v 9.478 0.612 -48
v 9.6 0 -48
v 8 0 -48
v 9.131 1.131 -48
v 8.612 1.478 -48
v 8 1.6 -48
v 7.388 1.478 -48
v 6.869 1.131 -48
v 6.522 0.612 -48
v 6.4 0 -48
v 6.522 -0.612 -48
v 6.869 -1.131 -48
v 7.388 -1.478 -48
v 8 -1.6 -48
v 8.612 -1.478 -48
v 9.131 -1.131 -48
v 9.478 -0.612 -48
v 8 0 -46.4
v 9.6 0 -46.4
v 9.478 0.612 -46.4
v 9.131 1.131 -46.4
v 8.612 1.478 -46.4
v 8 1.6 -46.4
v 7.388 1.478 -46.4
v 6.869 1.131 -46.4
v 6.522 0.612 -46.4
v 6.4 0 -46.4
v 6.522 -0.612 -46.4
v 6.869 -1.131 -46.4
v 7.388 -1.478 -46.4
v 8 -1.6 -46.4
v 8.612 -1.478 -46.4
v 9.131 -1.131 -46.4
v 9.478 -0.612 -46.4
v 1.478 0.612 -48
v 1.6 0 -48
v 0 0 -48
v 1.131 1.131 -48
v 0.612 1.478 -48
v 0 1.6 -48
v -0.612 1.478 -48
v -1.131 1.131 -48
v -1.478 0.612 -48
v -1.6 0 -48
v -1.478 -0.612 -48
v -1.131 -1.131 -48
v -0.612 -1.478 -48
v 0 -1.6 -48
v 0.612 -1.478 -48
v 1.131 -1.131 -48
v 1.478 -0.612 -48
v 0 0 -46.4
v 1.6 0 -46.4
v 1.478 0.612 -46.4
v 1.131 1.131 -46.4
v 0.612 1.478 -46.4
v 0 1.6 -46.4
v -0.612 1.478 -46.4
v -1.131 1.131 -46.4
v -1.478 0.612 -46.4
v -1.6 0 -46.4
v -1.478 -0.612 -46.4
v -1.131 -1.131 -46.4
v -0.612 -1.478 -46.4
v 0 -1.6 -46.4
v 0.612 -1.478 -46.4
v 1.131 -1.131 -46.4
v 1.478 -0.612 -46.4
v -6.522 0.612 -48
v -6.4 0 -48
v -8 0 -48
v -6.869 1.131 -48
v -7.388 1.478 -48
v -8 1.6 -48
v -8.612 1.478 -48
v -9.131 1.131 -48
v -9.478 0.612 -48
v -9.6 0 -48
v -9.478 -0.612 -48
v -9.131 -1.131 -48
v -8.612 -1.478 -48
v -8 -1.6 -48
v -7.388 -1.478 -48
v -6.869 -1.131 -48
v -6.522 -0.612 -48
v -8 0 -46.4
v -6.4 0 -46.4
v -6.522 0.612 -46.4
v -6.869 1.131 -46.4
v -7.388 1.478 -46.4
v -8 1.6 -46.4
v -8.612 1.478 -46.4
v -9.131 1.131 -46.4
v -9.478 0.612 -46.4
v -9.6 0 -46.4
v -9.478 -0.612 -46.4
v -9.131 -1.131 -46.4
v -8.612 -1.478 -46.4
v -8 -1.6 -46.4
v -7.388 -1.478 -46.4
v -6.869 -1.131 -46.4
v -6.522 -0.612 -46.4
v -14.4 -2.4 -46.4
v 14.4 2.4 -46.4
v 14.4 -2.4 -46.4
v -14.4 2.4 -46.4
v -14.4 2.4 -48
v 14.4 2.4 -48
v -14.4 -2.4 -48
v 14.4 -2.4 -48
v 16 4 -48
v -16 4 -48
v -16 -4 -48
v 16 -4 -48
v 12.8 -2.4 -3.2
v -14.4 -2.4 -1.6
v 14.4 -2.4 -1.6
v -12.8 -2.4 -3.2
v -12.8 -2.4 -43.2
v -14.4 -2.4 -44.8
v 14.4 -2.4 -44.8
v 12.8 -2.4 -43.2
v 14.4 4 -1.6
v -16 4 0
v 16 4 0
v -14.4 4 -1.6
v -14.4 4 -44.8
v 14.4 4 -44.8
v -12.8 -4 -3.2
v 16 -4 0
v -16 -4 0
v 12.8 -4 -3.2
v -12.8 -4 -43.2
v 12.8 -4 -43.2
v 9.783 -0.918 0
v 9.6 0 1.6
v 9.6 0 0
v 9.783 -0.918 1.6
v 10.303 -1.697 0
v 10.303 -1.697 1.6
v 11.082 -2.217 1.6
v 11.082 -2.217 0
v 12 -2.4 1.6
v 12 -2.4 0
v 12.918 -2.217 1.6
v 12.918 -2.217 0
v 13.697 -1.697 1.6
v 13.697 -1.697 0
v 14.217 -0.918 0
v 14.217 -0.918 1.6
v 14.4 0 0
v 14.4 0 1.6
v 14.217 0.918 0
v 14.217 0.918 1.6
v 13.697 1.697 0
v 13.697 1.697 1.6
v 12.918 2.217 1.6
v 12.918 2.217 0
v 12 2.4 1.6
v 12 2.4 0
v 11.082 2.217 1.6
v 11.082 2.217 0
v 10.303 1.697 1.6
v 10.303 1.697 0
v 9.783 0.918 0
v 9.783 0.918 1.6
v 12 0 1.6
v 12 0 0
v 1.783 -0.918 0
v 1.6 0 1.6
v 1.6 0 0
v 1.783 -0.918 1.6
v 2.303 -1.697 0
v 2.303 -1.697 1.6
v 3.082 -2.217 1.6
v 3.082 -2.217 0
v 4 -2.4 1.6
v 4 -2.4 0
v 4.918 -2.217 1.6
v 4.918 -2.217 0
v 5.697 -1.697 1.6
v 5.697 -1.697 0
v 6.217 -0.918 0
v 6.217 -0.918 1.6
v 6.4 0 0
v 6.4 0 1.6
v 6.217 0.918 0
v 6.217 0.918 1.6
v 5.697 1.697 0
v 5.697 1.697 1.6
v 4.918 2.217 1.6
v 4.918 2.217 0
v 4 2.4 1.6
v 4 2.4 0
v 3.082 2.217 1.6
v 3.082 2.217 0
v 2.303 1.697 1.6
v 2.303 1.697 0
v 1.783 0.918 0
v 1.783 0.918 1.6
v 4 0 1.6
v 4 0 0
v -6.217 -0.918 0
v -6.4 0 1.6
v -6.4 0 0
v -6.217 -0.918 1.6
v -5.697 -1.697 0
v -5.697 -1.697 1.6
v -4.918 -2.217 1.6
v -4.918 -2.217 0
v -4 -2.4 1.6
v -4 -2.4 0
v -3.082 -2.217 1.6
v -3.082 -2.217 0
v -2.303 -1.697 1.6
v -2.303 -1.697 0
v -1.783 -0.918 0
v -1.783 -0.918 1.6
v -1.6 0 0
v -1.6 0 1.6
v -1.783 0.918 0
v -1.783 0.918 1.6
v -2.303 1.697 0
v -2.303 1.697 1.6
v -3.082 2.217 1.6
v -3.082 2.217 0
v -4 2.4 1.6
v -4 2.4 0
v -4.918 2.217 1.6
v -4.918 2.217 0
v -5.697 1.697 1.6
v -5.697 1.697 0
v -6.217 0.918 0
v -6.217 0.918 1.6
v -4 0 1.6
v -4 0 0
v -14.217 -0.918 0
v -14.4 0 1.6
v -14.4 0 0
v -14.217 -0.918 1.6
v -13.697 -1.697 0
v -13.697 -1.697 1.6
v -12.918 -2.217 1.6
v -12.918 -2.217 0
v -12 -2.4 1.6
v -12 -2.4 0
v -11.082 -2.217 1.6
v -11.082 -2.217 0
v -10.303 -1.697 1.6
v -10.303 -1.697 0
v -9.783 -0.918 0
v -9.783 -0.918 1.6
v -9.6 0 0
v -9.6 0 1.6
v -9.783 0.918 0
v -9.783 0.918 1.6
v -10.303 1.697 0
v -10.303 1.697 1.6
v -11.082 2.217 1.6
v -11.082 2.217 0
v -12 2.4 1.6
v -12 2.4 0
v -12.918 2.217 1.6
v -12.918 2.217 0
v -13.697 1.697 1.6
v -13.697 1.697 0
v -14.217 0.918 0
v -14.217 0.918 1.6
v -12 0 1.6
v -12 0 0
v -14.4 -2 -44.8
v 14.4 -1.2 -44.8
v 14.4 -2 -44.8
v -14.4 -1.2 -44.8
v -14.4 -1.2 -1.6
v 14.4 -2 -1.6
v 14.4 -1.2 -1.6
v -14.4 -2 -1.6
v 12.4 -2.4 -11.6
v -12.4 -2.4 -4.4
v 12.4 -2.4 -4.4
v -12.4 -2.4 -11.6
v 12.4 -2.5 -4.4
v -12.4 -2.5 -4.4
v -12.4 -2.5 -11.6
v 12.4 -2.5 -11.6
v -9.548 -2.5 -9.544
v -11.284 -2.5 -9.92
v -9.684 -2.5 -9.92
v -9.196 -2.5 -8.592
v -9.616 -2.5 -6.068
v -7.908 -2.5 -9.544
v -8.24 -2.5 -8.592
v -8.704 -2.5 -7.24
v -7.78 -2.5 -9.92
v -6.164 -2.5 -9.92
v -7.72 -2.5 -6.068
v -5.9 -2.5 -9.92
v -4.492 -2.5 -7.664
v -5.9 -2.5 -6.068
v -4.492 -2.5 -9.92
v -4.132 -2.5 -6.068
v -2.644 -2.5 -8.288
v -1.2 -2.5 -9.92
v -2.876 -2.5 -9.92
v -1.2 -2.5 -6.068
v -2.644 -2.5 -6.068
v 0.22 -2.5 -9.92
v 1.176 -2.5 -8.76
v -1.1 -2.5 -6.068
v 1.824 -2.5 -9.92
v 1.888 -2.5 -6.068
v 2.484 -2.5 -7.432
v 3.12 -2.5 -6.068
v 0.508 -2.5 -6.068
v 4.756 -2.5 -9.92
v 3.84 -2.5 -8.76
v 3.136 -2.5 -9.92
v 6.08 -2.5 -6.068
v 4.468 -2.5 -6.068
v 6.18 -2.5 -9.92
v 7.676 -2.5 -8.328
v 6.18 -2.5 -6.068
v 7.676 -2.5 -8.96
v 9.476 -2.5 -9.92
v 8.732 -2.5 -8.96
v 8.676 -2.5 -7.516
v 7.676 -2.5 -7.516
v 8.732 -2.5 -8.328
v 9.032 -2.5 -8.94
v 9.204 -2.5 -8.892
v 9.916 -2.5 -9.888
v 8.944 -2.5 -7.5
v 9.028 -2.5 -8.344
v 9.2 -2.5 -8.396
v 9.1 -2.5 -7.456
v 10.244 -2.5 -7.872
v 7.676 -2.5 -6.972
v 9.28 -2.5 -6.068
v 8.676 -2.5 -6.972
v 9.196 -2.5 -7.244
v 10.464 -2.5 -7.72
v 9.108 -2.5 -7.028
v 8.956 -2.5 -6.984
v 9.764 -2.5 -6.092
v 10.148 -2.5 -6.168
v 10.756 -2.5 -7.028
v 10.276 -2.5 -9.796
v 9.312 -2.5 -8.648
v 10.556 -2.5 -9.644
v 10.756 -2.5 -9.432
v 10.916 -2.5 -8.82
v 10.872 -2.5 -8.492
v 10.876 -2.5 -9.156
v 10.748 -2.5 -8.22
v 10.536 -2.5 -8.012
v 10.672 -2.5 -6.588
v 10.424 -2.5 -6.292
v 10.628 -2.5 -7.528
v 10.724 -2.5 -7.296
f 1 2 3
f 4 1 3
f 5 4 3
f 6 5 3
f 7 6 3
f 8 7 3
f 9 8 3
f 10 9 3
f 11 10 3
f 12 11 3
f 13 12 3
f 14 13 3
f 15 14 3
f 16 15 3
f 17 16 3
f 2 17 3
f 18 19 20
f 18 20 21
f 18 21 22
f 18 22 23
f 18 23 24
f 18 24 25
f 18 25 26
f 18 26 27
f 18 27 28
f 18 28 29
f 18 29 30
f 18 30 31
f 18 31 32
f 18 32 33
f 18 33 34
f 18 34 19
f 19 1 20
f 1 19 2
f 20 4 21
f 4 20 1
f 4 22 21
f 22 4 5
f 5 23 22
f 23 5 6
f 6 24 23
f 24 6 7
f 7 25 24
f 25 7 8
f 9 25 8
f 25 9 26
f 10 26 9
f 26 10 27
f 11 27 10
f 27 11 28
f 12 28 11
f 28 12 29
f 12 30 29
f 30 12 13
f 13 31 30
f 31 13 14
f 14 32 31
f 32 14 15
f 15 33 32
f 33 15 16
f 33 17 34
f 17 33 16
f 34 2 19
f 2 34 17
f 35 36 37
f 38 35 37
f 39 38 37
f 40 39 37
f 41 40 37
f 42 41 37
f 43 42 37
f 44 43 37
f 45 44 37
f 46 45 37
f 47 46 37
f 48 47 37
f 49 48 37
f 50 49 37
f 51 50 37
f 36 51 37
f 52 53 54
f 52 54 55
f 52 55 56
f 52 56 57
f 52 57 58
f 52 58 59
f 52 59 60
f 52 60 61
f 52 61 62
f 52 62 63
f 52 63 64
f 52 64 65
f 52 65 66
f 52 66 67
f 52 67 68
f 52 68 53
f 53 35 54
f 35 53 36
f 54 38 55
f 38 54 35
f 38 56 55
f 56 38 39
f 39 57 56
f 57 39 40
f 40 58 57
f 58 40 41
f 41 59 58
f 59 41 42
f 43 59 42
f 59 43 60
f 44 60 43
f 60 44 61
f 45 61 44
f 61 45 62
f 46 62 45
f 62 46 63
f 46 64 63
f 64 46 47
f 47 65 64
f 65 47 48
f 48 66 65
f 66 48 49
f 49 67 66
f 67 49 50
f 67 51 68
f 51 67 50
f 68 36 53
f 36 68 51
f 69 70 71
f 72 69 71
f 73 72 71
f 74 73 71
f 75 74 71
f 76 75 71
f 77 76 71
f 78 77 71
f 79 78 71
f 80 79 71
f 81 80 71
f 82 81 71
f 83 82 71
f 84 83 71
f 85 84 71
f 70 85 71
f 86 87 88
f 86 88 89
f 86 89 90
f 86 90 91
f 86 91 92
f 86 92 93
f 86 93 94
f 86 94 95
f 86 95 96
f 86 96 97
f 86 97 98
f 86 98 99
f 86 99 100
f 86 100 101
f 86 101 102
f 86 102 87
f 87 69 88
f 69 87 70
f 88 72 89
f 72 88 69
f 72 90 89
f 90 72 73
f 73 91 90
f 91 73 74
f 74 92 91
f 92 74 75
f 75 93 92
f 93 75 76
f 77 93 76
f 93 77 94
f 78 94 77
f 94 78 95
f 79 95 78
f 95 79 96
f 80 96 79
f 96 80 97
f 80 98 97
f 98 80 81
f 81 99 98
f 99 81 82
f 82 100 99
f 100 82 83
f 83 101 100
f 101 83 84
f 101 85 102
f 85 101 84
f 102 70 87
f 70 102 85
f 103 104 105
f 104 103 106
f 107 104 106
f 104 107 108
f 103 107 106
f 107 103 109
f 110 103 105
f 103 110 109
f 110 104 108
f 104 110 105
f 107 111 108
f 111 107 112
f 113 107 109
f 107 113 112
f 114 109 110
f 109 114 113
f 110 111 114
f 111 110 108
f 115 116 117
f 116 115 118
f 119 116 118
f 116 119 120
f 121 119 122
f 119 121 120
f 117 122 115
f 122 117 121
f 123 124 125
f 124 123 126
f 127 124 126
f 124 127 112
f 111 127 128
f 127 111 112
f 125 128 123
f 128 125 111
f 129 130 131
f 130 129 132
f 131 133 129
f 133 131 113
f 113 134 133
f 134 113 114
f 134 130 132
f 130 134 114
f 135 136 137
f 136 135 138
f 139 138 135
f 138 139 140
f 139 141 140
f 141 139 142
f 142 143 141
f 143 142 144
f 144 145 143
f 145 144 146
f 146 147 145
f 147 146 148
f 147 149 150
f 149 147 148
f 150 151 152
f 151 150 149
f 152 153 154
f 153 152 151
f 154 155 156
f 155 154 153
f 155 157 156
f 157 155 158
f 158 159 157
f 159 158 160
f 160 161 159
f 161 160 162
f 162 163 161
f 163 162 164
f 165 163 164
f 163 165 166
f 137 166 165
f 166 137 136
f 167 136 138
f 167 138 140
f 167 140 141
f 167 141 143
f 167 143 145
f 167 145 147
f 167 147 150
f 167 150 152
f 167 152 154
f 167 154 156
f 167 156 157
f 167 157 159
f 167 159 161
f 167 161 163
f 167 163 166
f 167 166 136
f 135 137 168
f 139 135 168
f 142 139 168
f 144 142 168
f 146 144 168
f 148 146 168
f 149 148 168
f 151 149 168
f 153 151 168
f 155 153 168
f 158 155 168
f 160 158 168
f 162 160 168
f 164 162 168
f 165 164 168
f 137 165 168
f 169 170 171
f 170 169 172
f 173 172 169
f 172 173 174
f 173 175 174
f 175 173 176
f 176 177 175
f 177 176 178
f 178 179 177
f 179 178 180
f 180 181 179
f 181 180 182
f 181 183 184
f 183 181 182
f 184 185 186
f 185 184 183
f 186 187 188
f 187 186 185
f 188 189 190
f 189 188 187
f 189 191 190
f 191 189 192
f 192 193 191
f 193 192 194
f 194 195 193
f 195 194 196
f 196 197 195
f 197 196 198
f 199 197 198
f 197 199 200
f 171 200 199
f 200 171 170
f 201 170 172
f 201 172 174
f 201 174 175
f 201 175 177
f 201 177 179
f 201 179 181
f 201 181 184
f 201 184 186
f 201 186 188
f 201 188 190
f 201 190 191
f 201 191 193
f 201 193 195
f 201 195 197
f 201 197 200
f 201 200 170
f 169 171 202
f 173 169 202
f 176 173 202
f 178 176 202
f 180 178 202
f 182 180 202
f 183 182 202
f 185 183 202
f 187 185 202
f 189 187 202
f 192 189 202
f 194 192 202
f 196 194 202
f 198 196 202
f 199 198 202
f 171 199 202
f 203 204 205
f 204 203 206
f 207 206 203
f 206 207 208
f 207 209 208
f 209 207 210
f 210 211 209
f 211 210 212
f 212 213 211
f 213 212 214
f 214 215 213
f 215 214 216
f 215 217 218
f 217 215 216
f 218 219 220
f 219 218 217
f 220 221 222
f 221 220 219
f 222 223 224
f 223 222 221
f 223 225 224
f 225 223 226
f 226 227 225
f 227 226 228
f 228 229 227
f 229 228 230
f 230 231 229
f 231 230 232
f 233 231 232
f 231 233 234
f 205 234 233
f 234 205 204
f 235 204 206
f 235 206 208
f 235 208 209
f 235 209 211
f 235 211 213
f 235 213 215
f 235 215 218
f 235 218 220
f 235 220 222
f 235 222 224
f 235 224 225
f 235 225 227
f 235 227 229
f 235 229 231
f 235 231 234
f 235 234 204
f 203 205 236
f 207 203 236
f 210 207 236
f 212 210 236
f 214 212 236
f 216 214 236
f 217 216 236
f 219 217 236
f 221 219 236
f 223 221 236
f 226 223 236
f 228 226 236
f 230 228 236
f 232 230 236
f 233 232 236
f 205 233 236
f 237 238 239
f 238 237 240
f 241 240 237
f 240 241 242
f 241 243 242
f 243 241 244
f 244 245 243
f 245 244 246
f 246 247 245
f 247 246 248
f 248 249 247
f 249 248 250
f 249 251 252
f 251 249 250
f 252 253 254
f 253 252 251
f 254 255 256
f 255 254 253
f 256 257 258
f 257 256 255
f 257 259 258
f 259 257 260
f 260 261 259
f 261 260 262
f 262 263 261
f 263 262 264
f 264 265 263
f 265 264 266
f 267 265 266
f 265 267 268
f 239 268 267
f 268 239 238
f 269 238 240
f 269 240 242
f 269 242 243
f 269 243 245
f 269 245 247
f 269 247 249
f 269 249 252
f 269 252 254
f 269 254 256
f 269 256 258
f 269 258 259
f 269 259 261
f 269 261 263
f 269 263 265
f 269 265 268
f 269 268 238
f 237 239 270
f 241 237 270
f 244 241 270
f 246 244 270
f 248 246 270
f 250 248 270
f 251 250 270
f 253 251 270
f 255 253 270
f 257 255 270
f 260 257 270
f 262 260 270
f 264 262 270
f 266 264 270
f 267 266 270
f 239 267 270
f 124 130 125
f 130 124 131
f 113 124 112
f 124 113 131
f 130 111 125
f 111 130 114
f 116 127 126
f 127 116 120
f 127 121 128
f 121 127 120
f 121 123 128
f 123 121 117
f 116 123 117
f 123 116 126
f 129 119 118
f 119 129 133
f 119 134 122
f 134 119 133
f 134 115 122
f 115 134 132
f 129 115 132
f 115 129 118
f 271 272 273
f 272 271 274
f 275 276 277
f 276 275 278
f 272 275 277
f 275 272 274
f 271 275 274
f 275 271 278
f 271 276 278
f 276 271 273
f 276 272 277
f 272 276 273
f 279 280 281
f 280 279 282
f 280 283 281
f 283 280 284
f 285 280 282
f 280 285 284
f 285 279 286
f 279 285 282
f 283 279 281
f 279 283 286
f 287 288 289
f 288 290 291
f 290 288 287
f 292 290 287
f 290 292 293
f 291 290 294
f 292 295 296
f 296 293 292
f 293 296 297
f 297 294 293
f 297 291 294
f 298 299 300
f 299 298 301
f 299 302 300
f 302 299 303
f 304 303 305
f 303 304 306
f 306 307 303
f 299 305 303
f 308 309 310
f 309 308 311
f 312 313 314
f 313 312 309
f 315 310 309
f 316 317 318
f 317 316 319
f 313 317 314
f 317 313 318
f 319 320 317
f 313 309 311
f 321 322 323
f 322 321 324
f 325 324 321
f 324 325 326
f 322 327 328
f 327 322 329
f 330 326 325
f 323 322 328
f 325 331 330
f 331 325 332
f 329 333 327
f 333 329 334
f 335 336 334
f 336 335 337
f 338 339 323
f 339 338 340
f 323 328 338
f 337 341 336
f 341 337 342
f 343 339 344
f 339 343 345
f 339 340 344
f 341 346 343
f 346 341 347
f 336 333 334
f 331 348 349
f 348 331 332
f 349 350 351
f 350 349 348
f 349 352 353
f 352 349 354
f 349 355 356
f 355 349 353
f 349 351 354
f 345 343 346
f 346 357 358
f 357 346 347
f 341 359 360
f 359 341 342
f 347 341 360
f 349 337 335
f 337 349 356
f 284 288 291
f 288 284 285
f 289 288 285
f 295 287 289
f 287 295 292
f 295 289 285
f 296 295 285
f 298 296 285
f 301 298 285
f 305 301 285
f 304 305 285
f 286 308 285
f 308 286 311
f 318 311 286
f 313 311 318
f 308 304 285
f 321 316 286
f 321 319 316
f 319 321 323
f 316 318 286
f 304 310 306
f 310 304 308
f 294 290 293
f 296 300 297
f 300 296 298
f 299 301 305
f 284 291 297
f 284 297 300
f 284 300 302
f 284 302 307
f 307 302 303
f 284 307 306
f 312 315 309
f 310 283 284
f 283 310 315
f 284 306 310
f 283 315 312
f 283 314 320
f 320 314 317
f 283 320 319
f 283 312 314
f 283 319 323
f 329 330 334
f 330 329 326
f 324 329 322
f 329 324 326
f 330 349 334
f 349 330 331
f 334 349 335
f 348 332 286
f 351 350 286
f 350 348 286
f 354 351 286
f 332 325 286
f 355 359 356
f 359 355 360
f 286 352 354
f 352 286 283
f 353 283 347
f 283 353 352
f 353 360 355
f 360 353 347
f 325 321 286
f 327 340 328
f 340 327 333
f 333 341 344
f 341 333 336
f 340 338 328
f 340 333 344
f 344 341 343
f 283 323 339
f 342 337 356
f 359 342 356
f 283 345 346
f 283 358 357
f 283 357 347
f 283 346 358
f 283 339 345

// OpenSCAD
// file: ../p/4-4edge.scad
use <../lib.scad>
function ldraw_lib__4_4edge() = [
// 0 Circle 1.0
// 0 Name: 4-4edge.dat
// 0 Author: James Jessiman
// 0 !LDRAW_ORG Primitive UPDATE 2017-01
// 0 !LICENSE Licensed under CC BY 2.0 and CC BY 4.0 : see CAreadme.txt
// 
// 0 BFC CERTIFY CCW
  [0,"BFC","CERTIFY"],
  [0,"BFC","CCW"],
// 
// 0 !HISTORY 1998-12-15 [PTadmin] Official Update 1998-10
// 0 !HISTORY 2005-12-28 [PTadmin] Official Update 2005-01
// 0 !HISTORY 2007-06-24 [PTadmin] Header formatted for Contributor Agreement
// 0 !HISTORY 2008-07-01 [PTadmin] Official Update 2008-01
// 0 !HISTORY 2017-01-15 [Steffen] BFCed
// 0 !HISTORY 2017-12-30 [PTadmin] Official Update 2017-01
// 
// 
// 2 24 1 0 0 0.9239 0 0.3827
  [2,24,1,0,0,0.9239,0,0.3827],
// 2 24 0.9239 0 0.3827 0.7071 0 0.7071
  [2,24,0.9239,0,0.3827,0.7071,0,0.7071],
// 2 24 0.7071 0 0.7071 0.3827 0 0.9239
  [2,24,0.7071,0,0.7071,0.3827,0,0.9239],
// 2 24 0.3827 0 0.9239 0 0 1
  [2,24,0.3827,0,0.9239,0,0,1],
// 2 24 0 0 1 -0.3827 0 0.9239
  [2,24,0,0,1,-0.3827,0,0.9239],
// 2 24 -0.3827 0 0.9239 -0.7071 0 0.7071
  [2,24,-0.3827,0,0.9239,-0.7071,0,0.7071],
// 2 24 -0.7071 0 0.7071 -0.9239 0 0.3827
  [2,24,-0.7071,0,0.7071,-0.9239,0,0.3827],
// 2 24 -0.9239 0 0.3827 -1 0 -0
  [2,24,-0.9239,0,0.3827,-1,0,-0],
// 2 24 -1 0 -0 -0.9239 0 -0.3827
  [2,24,-1,0,-0,-0.9239,0,-0.3827],
// 2 24 -0.9239 0 -0.3827 -0.7071 0 -0.7071
  [2,24,-0.9239,0,-0.3827,-0.7071,0,-0.7071],
// 2 24 -0.7071 0 -0.7071 -0.3827 0 -0.9239
  [2,24,-0.7071,0,-0.7071,-0.3827,0,-0.9239],
// 2 24 -0.3827 0 -0.9239 0 0 -1
  [2,24,-0.3827,0,-0.9239,0,0,-1],
// 2 24 0 0 -1 0.3827 0 -0.9239
  [2,24,0,0,-1,0.3827,0,-0.9239],
// 2 24 0.3827 0 -0.9239 0.7071 0 -0.7071
  [2,24,0.3827,0,-0.9239,0.7071,0,-0.7071],
// 2 24 0.7071 0 -0.7071 0.9239 0 -0.3827
  [2,24,0.7071,0,-0.7071,0.9239,0,-0.3827],
// 2 24 0.9239 0 -0.3827 1 0 0
  [2,24,0.9239,0,-0.3827,1,0,0],
];
module ldraw_lib__4_4edge(step=0, col=false, unit=2/5, alt=false, line=0.2, solid=!$preview)
    makepoly(ldraw_lib__4_4edge(), step=step, col=col, unit=unit, alt=alt, line=line, solid=solid);
ldraw_lib__4_4edge(line=0.2);
// file: ../p/4-4disc.scad
use <../lib.scad>
function ldraw_lib__4_4disc() = [
// 0 Disc 1.0
// 0 Name: 4-4disc.dat
// 0 Author: James Jessiman
// 0 !LDRAW_ORG Primitive UPDATE 2002-02
// 0 !LICENSE Licensed under CC BY 2.0 and CC BY 4.0 : see CAreadme.txt
// 
// 0 BFC CERTIFY CCW
  [0,"BFC","CERTIFY"],
  [0,"BFC","CCW"],
// 
// 0 !HISTORY 1998-12-15 [PTadmin] Official Update 1998-10
// 0 !HISTORY 2002-03-23 [sbliss] Added BFC statement
// 0 !HISTORY 2002-04-25 [PTadmin] Official Update 2002-02
// 0 !HISTORY 2007-06-24 [PTadmin] Header formatted for Contributor Agreement
// 0 !HISTORY 2008-07-01 [PTadmin] Official Update 2008-01
// 
// 
// 3 16 0 0 0 1 0 0 0.9239 0 0.3827
  [3,16,0,0,0,1,0,0,0.9239,0,0.3827],
// 3 16 0 0 0 0.9239 0 0.3827 0.7071 0 0.7071
  [3,16,0,0,0,0.9239,0,0.3827,0.7071,0,0.7071],
// 3 16 0 0 0 0.7071 0 0.7071 0.3827 0 0.9239
  [3,16,0,0,0,0.7071,0,0.7071,0.3827,0,0.9239],
// 3 16 0 0 0 0.3827 0 0.9239 0 0 1
  [3,16,0,0,0,0.3827,0,0.9239,0,0,1],
// 3 16 0 0 0 0 0 1 -0.3827 0 0.9239
  [3,16,0,0,0,0,0,1,-0.3827,0,0.9239],
// 3 16 0 0 0 -0.3827 0 0.9239 -0.7071 0 0.7071
  [3,16,0,0,0,-0.3827,0,0.9239,-0.7071,0,0.7071],
// 3 16 0 0 0 -0.7071 0 0.7071 -0.9239 0 0.3827
  [3,16,0,0,0,-0.7071,0,0.7071,-0.9239,0,0.3827],
// 3 16 0 0 0 -0.9239 0 0.3827 -1 0 -0
  [3,16,0,0,0,-0.9239,0,0.3827,-1,0,-0],
// 3 16 0 0 0 -1 0 -0 -0.9239 0 -0.3827
  [3,16,0,0,0,-1,0,-0,-0.9239,0,-0.3827],
// 3 16 0 0 0 -0.9239 0 -0.3827 -0.7071 0 -0.7071
  [3,16,0,0,0,-0.9239,0,-0.3827,-0.7071,0,-0.7071],
// 3 16 0 0 0 -0.7071 0 -0.7071 -0.3827 0 -0.9239
  [3,16,0,0,0,-0.7071,0,-0.7071,-0.3827,0,-0.9239],
// 3 16 0 0 0 -0.3827 0 -0.9239 0 0 -1
  [3,16,0,0,0,-0.3827,0,-0.9239,0,0,-1],
// 3 16 0 0 0 0 0 -1 0.3827 0 -0.9239
  [3,16,0,0,0,0,0,-1,0.3827,0,-0.9239],
// 3 16 0 0 0 0.3827 0 -0.9239 0.7071 0 -0.7071
  [3,16,0,0,0,0.3827,0,-0.9239,0.7071,0,-0.7071],
// 3 16 0 0 0 0.7071 0 -0.7071 0.9239 0 -0.3827
  [3,16,0,0,0,0.7071,0,-0.7071,0.9239,0,-0.3827],
// 3 16 0 0 0 0.9239 0 -0.3827 1 0 0
  [3,16,0,0,0,0.9239,0,-0.3827,1,0,0],
// 0
];
module ldraw_lib__4_4disc(step=0, col=false, unit=2/5, alt=false, line=0.2, solid=!$preview)
    makepoly(ldraw_lib__4_4disc(), step=step, col=col, unit=unit, alt=alt, line=line, solid=solid);
ldraw_lib__4_4disc(line=0.2);
// file: ../p/4-4cyli.scad
use <../lib.scad>
$fa=1; $fs=0.2;
function ldraw_lib__4_4cyli(realsolid=false) = [
// 0 Cylinder 1.0
// 0 Name: 4-4cyli.dat
// 0 Author: James Jessiman
// 0 !LDRAW_ORG Primitive UPDATE 2005-01
// 0 !LICENSE Licensed under CC BY 2.0 and CC BY 4.0 : see CAreadme.txt
// 
// 0 BFC CERTIFY CCW
  [0,"BFC","CERTIFY"],
  [0,"BFC","CCW"],
// 
// 0 !HISTORY 1998-12-15 [PTadmin] Official Update 1998-10
// 0 !HISTORY 2002-03-23 [sbliss] Added BFC statement; merged headers from files in distributions LDraw 0.27 and Complete.
// 0 !HISTORY 2002-04-25 [PTadmin] Official Update 2002-02
// 0 !HISTORY 2004-12-14 [guyvivan] BFC CCW
// 0 !HISTORY 2005-12-28 [PTadmin] Official Update 2005-01
// 0 !HISTORY 2007-06-24 [PTadmin] Header formatted for Contributor Agreement
// 0 !HISTORY 2008-07-01 [PTadmin] Official Update 2008-01
// 
// 
// 4 16 1 1 0 0.9239 1 0.3827 0.9239 0 0.3827 1 0 0
  [4,16,1,1,0,0.9239,1,0.3827,0.9239,0,0.3827,1,0,0],
// 5 24 1 0 0 1 1 0 0.9239 0 0.3827 0.9239 0 -0.3827
  [5,24,1,0,0,1,1,0,0.9239,0,0.3827,0.9239,0,-0.3827],
// 4 16 0.9239 1 0.3827 0.7071 1 0.7071 0.7071 0 0.7071 0.9239 0 0.3827
  [4,16,0.9239,1,0.3827,0.7071,1,0.7071,0.7071,0,0.7071,0.9239,0,0.3827],
// 5 24 0.9239 0 0.3827 0.9239 1 0.3827 0.7071 0 0.7071 1 0 0
  [5,24,0.9239,0,0.3827,0.9239,1,0.3827,0.7071,0,0.7071,1,0,0],
// 4 16 0.7071 1 0.7071 0.3827 1 0.9239 0.3827 0 0.9239 0.7071 0 0.7071
  [4,16,0.7071,1,0.7071,0.3827,1,0.9239,0.3827,0,0.9239,0.7071,0,0.7071],
// 5 24 0.7071 0 0.7071 0.7071 1 0.7071 0.3827 0 0.9239 0.9239 0 0.3827
  [5,24,0.7071,0,0.7071,0.7071,1,0.7071,0.3827,0,0.9239,0.9239,0,0.3827],
// 4 16 0.3827 1 0.9239 0 1 1 0 0 1 0.3827 0 0.9239
  [4,16,0.3827,1,0.9239,0,1,1,0,0,1,0.3827,0,0.9239],
// 5 24 0.3827 0 0.9239 0.3827 1 0.9239 0 0 1 0.7071 0 0.7071
  [5,24,0.3827,0,0.9239,0.3827,1,0.9239,0,0,1,0.7071,0,0.7071],
// 4 16 0 1 1 -0.3827 1 0.9239 -0.3827 0 0.9239 0 0 1
  [4,16,0,1,1,-0.3827,1,0.9239,-0.3827,0,0.9239,0,0,1],
// 5 24 0 0 1 0 1 1 -0.3827 0 0.9239 0.3827 0 0.9239
  [5,24,0,0,1,0,1,1,-0.3827,0,0.9239,0.3827,0,0.9239],
// 4 16 -0.3827 1 0.9239 -0.7071 1 0.7071 -0.7071 0 0.7071 -0.3827 0 0.9239
  [4,16,-0.3827,1,0.9239,-0.7071,1,0.7071,-0.7071,0,0.7071,-0.3827,0,0.9239],
// 5 24 -0.3827 0 0.9239 -0.3827 1 0.9239 -0.7071 0 0.7071 0 0 1
  [5,24,-0.3827,0,0.9239,-0.3827,1,0.9239,-0.7071,0,0.7071,0,0,1],
// 4 16 -0.7071 1 0.7071 -0.9239 1 0.3827 -0.9239 0 0.3827 -0.7071 0 0.7071
  [4,16,-0.7071,1,0.7071,-0.9239,1,0.3827,-0.9239,0,0.3827,-0.7071,0,0.7071],
// 5 24 -0.7071 0 0.7071 -0.7071 1 0.7071 -0.9239 0 0.3827 -0.3827 0 0.9239
  [5,24,-0.7071,0,0.7071,-0.7071,1,0.7071,-0.9239,0,0.3827,-0.3827,0,0.9239],
// 4 16 -0.9239 1 0.3827 -1 1 0 -1 0 0 -0.9239 0 0.3827
  [4,16,-0.9239,1,0.3827,-1,1,0,-1,0,0,-0.9239,0,0.3827],
// 5 24 -0.9239 0 0.3827 -0.9239 1 0.3827 -1 0 0 -0.7071 0 0.7071
  [5,24,-0.9239,0,0.3827,-0.9239,1,0.3827,-1,0,0,-0.7071,0,0.7071],
// 4 16 -1 1 0 -0.9239 1 -0.3827 -0.9239 0 -0.3827 -1 0 0
  [4,16,-1,1,0,-0.9239,1,-0.3827,-0.9239,0,-0.3827,-1,0,0],
// 5 24 -1 0 0 -1 1 0 -0.9239 0 -0.3827 -0.9239 0 0.3827
  [5,24,-1,0,0,-1,1,0,-0.9239,0,-0.3827,-0.9239,0,0.3827],
// 4 16 -0.9239 1 -0.3827 -0.7071 1 -0.7071 -0.7071 0 -0.7071 -0.9239 0 -0.3827
  [4,16,-0.9239,1,-0.3827,-0.7071,1,-0.7071,-0.7071,0,-0.7071,-0.9239,0,-0.3827],
// 5 24 -0.9239 0 -0.3827 -0.9239 1 -0.3827 -0.7071 0 -0.7071 -1 0 0
  [5,24,-0.9239,0,-0.3827,-0.9239,1,-0.3827,-0.7071,0,-0.7071,-1,0,0],
// 4 16 -0.7071 1 -0.7071 -0.3827 1 -0.9239 -0.3827 0 -0.9239 -0.7071 0 -0.7071
  [4,16,-0.7071,1,-0.7071,-0.3827,1,-0.9239,-0.3827,0,-0.9239,-0.7071,0,-0.7071],
// 5 24 -0.7071 0 -0.7071 -0.7071 1 -0.7071 -0.3827 0 -0.9239 -0.9239 0 -0.3827
  [5,24,-0.7071,0,-0.7071,-0.7071,1,-0.7071,-0.3827,0,-0.9239,-0.9239,0,-0.3827],
// 4 16 -0.3827 1 -0.9239 0 1 -1 0 0 -1 -0.3827 0 -0.9239
  [4,16,-0.3827,1,-0.9239,0,1,-1,0,0,-1,-0.3827,0,-0.9239],
// 5 24 -0.3827 0 -0.9239 -0.3827 1 -0.9239 0 0 -1 -0.7071 0 -0.7071
  [5,24,-0.3827,0,-0.9239,-0.3827,1,-0.9239,0,0,-1,-0.7071,0,-0.7071],
// 4 16 0 1 -1 0.3827 1 -0.9239 0.3827 0 -0.9239 0 0 -1
  [4,16,0,1,-1,0.3827,1,-0.9239,0.3827,0,-0.9239,0,0,-1],
// 5 24 0 0 -1 0 1 -1 0.3827 0 -0.9239 -0.3827 0 -0.9239
  [5,24,0,0,-1,0,1,-1,0.3827,0,-0.9239,-0.3827,0,-0.9239],
// 4 16 0.3827 1 -0.9239 0.7071 1 -0.7071 0.7071 0 -0.7071 0.3827 0 -0.9239
  [4,16,0.3827,1,-0.9239,0.7071,1,-0.7071,0.7071,0,-0.7071,0.3827,0,-0.9239],
// 5 24 0.3827 0 -0.9239 0.3827 1 -0.9239 0.7071 0 -0.7071 0 0 -1
  [5,24,0.3827,0,-0.9239,0.3827,1,-0.9239,0.7071,0,-0.7071,0,0,-1],
// 4 16 0.7071 1 -0.7071 0.9239 1 -0.3827 0.9239 0 -0.3827 0.7071 0 -0.7071
  [4,16,0.7071,1,-0.7071,0.9239,1,-0.3827,0.9239,0,-0.3827,0.7071,0,-0.7071],
// 5 24 0.7071 0 -0.7071 0.7071 1 -0.7071 0.9239 0 -0.3827 0.3827 0 -0.9239
  [5,24,0.7071,0,-0.7071,0.7071,1,-0.7071,0.9239,0,-0.3827,0.3827,0,-0.9239],
// 4 16 0.9239 1 -0.3827 1 1 0 1 0 0 0.9239 0 -0.3827
  [4,16,0.9239,1,-0.3827,1,1,0,1,0,0,0.9239,0,-0.3827],
// 5 24 0.9239 0 -0.3827 0.9239 1 -0.3827 1 0 0 0.7071 0 -0.7071
  [5,24,0.9239,0,-0.3827,0.9239,1,-0.3827,1,0,0,0.7071,0,-0.7071],
// 0
];
module ldraw_lib__4_4cyli(step=0, col=false, unit=2/5, alt=false, line=0.2, solid=!$preview)
    makepoly(ldraw_lib__4_4cyli(solid), step=step, col=col, unit=unit, alt=alt, line=line, solid=solid);
ldraw_lib__4_4cyli(line=0.2);
// file: ../p/box.scad
use <../lib.scad>
function ldraw_lib__box() = [
// 0 Box 6 (six faces)
// 0 Name: box.dat
// 0 Author: James Jessiman
// 0 !LDRAW_ORG Primitive UPDATE 2002-05
// 0 !LICENSE Licensed under CC BY 2.0 and CC BY 4.0 : see CAreadme.txt
// 
// 0 BFC CERTIFY CCW
  [0,"BFC","CERTIFY"],
  [0,"BFC","CCW"],
// 
// 0 !HISTORY 2002-08-22 [sbliss] Applied BFC
// 0 !HISTORY 2002-11-30 [PTadmin] Official Update 2002-05
// 0 !HISTORY 2007-06-24 [PTadmin] Header formatted for Contributor Agreement
// 0 !HISTORY 2008-07-01 [PTadmin] Official Update 2008-01
// 
// 
// 2 24 1 1 1 -1 1 1
  [2,24,1,1,1,-1,1,1],
// 2 24 -1 1 1 -1 1 -1
  [2,24,-1,1,1,-1,1,-1],
// 2 24 -1 1 -1 1 1 -1
  [2,24,-1,1,-1,1,1,-1],
// 2 24 1 1 -1 1 1 1
  [2,24,1,1,-1,1,1,1],
// 2 24 1 -1 1 -1 -1 1
  [2,24,1,-1,1,-1,-1,1],
// 2 24 -1 -1 1 -1 -1 -1
  [2,24,-1,-1,1,-1,-1,-1],
// 2 24 -1 -1 -1 1 -1 -1
  [2,24,-1,-1,-1,1,-1,-1],
// 2 24 1 -1 -1 1 -1 1
  [2,24,1,-1,-1,1,-1,1],
// 2 24 1 -1 1 1 1 1
  [2,24,1,-1,1,1,1,1],
// 2 24 -1 -1 1 -1 1 1
  [2,24,-1,-1,1,-1,1,1],
// 2 24 1 -1 -1 1 1 -1
  [2,24,1,-1,-1,1,1,-1],
// 2 24 -1 -1 -1 -1 1 -1
  [2,24,-1,-1,-1,-1,1,-1],
// 4 16 1 1 1 1 1 -1 -1 1 -1 -1 1 1
  [4,16,1,1,1,1,1,-1,-1,1,-1,-1,1,1],
// 4 16 -1 -1 -1 1 -1 -1 1 -1 1 -1 -1 1
  [4,16,-1,-1,-1,1,-1,-1,1,-1,1,-1,-1,1],
// 4 16 -1 -1 1 1 -1 1 1 1 1 -1 1 1
  [4,16,-1,-1,1,1,-1,1,1,1,1,-1,1,1],
// 4 16 -1 -1 -1 -1 -1 1 -1 1 1 -1 1 -1
  [4,16,-1,-1,-1,-1,-1,1,-1,1,1,-1,1,-1],
// 4 16 1 -1 -1 -1 -1 -1 -1 1 -1 1 1 -1
  [4,16,1,-1,-1,-1,-1,-1,-1,1,-1,1,1,-1],
// 4 16 1 -1 1 1 -1 -1 1 1 -1 1 1 1
  [4,16,1,-1,1,1,-1,-1,1,1,-1,1,1,1],
// 0
];
makepoly(ldraw_lib__box(), line=0.2);
// file: ../p/stud3.scad
use <../lib.scad>
use <4-4cyli.scad>
use <4-4disc.scad>
use <4-4edge.scad>
function ldraw_lib__stud3() = [
// 0 Stud Tube Solid
// 0 Name: stud3.dat
// 0 Author: James Jessiman
// 0 !LDRAW_ORG Primitive UPDATE 2012-01
// 0 !LICENSE Licensed under CC BY 4.0 : see CAreadme.txt
// 
// 0 BFC CERTIFY CCW
  [0,"BFC","CERTIFY"],
  [0,"BFC","CCW"],
// 
// 0 !HISTORY 2002-04-04 [sbliss] Modified for BFC compliance
// 0 !HISTORY 2002-04-25 [PTadmin] Official Update 2002-02
// 0 !HISTORY 2007-06-24 [PTadmin] Header formatted for Contributor Agreement
// 0 !HISTORY 2008-07-01 [PTadmin] Official Update 2008-01
// 0 !HISTORY 2012-02-16 [Philo] Changed to CCW
// 0 !HISTORY 2012-03-30 [PTadmin] Official Update 2012-01
// 
// 
// 1 16 0 -4 0 4 0 0 0 1 0 0 0 4 4-4edge.dat
  [1,16,0,-4,0,4,0,0,0,1,0,0,0,4, ldraw_lib__4_4edge()],
// 1 16 0 0 0 4 0 0 0 1 0 0 0 4 4-4edge.dat
  [1,16,0,0,0,4,0,0,0,1,0,0,0,4, ldraw_lib__4_4edge()],
// 1 16 0 -4 0 4 0 0 0 1 0 0 0 4 4-4disc.dat
  [1,16,0,-4,0,4,0,0,0,1,0,0,0,4, ldraw_lib__4_4disc()],
  [-1,16,0,0,0,4,0,0,0,-1,0,0,0,4, ldraw_lib__4_4disc()],
// 1 16 0 -4 0 4 0 0 0 4 0 0 0 4 4-4cyli.dat
  [1,16,0,-4,0,4,0,0,0,4,0,0,0,4, ldraw_lib__4_4cyli()],
];
module ldraw_lib__stud3(step=0, col=false, unit=2/5, alt=false, line=0.2, solid=!$preview)
    makepoly(ldraw_lib__stud3(), step=step, col=col, unit=unit, alt=alt, line=line, solid=solid);
ldraw_lib__stud3(line=0.2);
// file: ../p/stud.scad
use <../lib.scad>
use <4-4cyli.scad>
use <4-4disc.scad>
use <4-4edge.scad>
function ldraw_lib__stud() = [
// 0 Stud
// 0 Name: stud.dat
// 0 Author: James Jessiman
// 0 !LDRAW_ORG Primitive UPDATE 2012-01
// 0 !LICENSE Licensed under CC BY 4.0 : see CAreadme.txt
// 
// 0 BFC CERTIFY CCW
  [0,"BFC","CERTIFY"],
  [0,"BFC","CCW"],
// 
// 0 !HISTORY 2002-04-04 [sbliss] Modified for BFC compliance
// 0 !HISTORY 2002-04-25 [PTadmin] Official Update 2002-02
// 0 !HISTORY 2007-06-24 [PTadmin] Header formatted for Contributor Agreement
// 0 !HISTORY 2008-07-01 [PTadmin] Official Update 2008-01
// 0 !HISTORY 2012-02-16 [Philo] Changed to CCW
// 0 !HISTORY 2012-03-30 [PTadmin] Official Update 2012-01
// 
// 
// 1 16 0 0 0 6 0 0 0 1 0 0 0 6 4-4edge.dat
  [1,16,0,0,0,6,0,0,0,1,0,0,0,6, ldraw_lib__4_4edge()],
// 1 16 0 -4 0 6 0 0 0 1 0 0 0 6 4-4edge.dat
  [1,16,0,-4,0,6,0,0,0,1,0,0,0,6, ldraw_lib__4_4edge()],
// 1 16 0 0 0 6 0 0 0 -4 0 0 0 6 4-4cyli.dat
  [1,16,0,0,0,6,0,0,0,-4,0,0,0,6, ldraw_lib__4_4cyli()],
// 1 16 0 -4 0 6 0 0 0 1 0 0 0 6 4-4disc.dat
  [1,16,0,-4,0,6,0,0,0,1,0,0,0,6, ldraw_lib__4_4disc()],
  [-1,16,0,0,0,6,0,0,0,-1,0,0,0,6, ldraw_lib__4_4disc()],
];
module ldraw_lib__stud(step=0, col=false, unit=2/5, alt=false, line=0.2, solid=!$preview)
    makepoly(ldraw_lib__stud(), step=step, col=col, unit=unit, alt=alt, line=line, solid=solid);
ldraw_lib__stud(line=0.2);
// file: ../p/box5.scad
use <../lib.scad>
function ldraw_lib__box5() = [
// 0 Box with 5 Faces and All Edges
// 0 Name: box5.dat
// 0 Author: James Jessiman
// 0 !LDRAW_ORG Primitive UPDATE 2012-01
// 0 !LICENSE Licensed under CC BY 2.0 and CC BY 4.0 : see CAreadme.txt
// 
// 0 BFC CERTIFY CCW
  [0,"BFC","CERTIFY"],
  [0,"BFC","CCW"],
// 
// 0 !HISTORY 2002-04-03 [sbliss] Modified for BFC compliance
// 0 !HISTORY 2002-04-25 [PTadmin] Official Update 2002-02
// 0 !HISTORY 2007-06-24 [PTadmin] Header formatted for Contributor Agreement
// 0 !HISTORY 2008-07-01 [PTadmin] Official Update 2008-01
// 0 !HISTORY 2012-02-16 [Philo] Changed to CCW
// 0 !HISTORY 2012-03-30 [PTadmin] Official Update 2012-01
// 
// 
// 2 24 1 1 1 -1 1 1
  [2,24,1,1,1,-1,1,1],
// 2 24 -1 1 1 -1 1 -1
  [2,24,-1,1,1,-1,1,-1],
// 2 24 -1 1 -1 1 1 -1
  [2,24,-1,1,-1,1,1,-1],
// 2 24 1 1 -1 1 1 1
  [2,24,1,1,-1,1,1,1],
// 2 24 1 0 1 -1 0 1
  [2,24,1,0,1,-1,0,1],
// 2 24 -1 0 1 -1 0 -1
  [2,24,-1,0,1,-1,0,-1],
// 2 24 -1 0 -1 1 0 -1
  [2,24,-1,0,-1,1,0,-1],
// 2 24 1 0 -1 1 0 1
  [2,24,1,0,-1,1,0,1],
// 2 24 1 0 1 1 1 1
  [2,24,1,0,1,1,1,1],
// 2 24 -1 0 1 -1 1 1
  [2,24,-1,0,1,-1,1,1],
// 2 24 1 0 -1 1 1 -1
  [2,24,1,0,-1,1,1,-1],
// 2 24 -1 0 -1 -1 1 -1
  [2,24,-1,0,-1,-1,1,-1],
// 4 16 -1 1 1 1 1 1 1 1 -1 -1 1 -1
  [4,16,-1,1,1,1,1,1,1,1,-1,-1,1,-1],
// 4 16 -1 1 1 -1 0 1 1 0 1 1 1 1
  [4,16,-1,1,1,-1,0,1,1,0,1,1,1,1],
// 4 16 -1 1 -1 -1 0 -1 -1 0 1 -1 1 1
  [4,16,-1,1,-1,-1,0,-1,-1,0,1,-1,1,1],
// 4 16 1 1 -1 1 0 -1 -1 0 -1 -1 1 -1
  [4,16,1,1,-1,1,0,-1,-1,0,-1,-1,1,-1],
// 4 16 1 1 1 1 0 1 1 0 -1 1 1 -1
  [4,16,1,1,1,1,0,1,1,0,-1,1,1,-1],
];
makepoly(ldraw_lib__box5(), line=0.2);
// file: ../p/box4.scad
use <../lib.scad>
function ldraw_lib__box4() = [
// 0 Box with 4 Faces (2 Parallel Pairs) and All Edges
// 0 Name: box4.dat
// 0 Author: James Jessiman
// 0 !LDRAW_ORG Primitive UPDATE 2012-01
// 0 !LICENSE Licensed under CC BY 4.0 : see CAreadme.txt
// 
// 0 BFC CERTIFY CCW
  [0,"BFC","CERTIFY"],
  [0,"BFC","CCW"],
// 
// 0 !HISTORY 2002-04-03 [sbliss] Modified for BFC compliance
// 0 !HISTORY 2002-04-25 [PTadmin] Official Update 2002-02
// 0 !HISTORY 2007-06-24 [PTadmin] Header formatted for Contributor Agreement
// 0 !HISTORY 2008-07-01 [PTadmin] Official Update 2008-01
// 0 !HISTORY 2012-02-16 [Philo] Changed to CCW
// 0 !HISTORY 2012-03-30 [PTadmin] Official Update 2012-01
// 
// 
// 2 24 1 1 1 -1 1 1
  [2,24,1,1,1,-1,1,1],
// 2 24 -1 1 1 -1 1 -1
  [2,24,-1,1,1,-1,1,-1],
// 2 24 -1 1 -1 1 1 -1
  [2,24,-1,1,-1,1,1,-1],
// 2 24 1 1 -1 1 1 1
  [2,24,1,1,-1,1,1,1],
// 2 24 1 0 1 -1 0 1
  [2,24,1,0,1,-1,0,1],
// 2 24 -1 0 1 -1 0 -1
  [2,24,-1,0,1,-1,0,-1],
// 2 24 -1 0 -1 1 0 -1
  [2,24,-1,0,-1,1,0,-1],
// 2 24 1 0 -1 1 0 1
  [2,24,1,0,-1,1,0,1],
// 2 24 1 0 1 1 1 1
  [2,24,1,0,1,1,1,1],
// 2 24 -1 0 1 -1 1 1
  [2,24,-1,0,1,-1,1,1],
// 2 24 1 0 -1 1 1 -1
  [2,24,1,0,-1,1,1,-1],
// 2 24 -1 0 -1 -1 1 -1
  [2,24,-1,0,-1,-1,1,-1],
// 4 16 -1 1 1 -1 0 1 1 0 1 1 1 1
  [4,16,-1,1,1,-1,0,1,1,0,1,1,1,1],
// 4 16 -1 1 -1 -1 0 -1 -1 0 1 -1 1 1
  [4,16,-1,1,-1,-1,0,-1,-1,0,1,-1,1,1],
// 4 16 1 1 -1 1 0 -1 -1 0 -1 -1 1 -1
  [4,16,1,1,-1,1,0,-1,-1,0,-1,-1,1,-1],
// 4 16 1 1 1 1 0 1 1 0 -1 1 1 -1
  [4,16,1,1,1,1,0,1,1,0,-1,1,1,-1],
];
module ldraw_lib__box4(step=0, col=false, unit=2/5, alt=false, line=0.2, solid=!$preview)
    makepoly(ldraw_lib__box4(), step=step, col=col, unit=unit, alt=alt, line=line, solid=solid);
ldraw_lib__box4(line=0.2);
// file: ../p/box3u2p.scad
use <../lib.scad>
function ldraw_lib__box3u2p() = [
// 0 Box with 3 Faces without 2 Parallel Edges
// 0 Name: box3u2p.dat
// 0 Author: Niels Karsdorp [nielsk]
// 0 !LDRAW_ORG Primitive UPDATE 2012-01
// 0 !LICENSE Licensed under CC BY 2.0 and CC BY 4.0 : see CAreadme.txt
// 
// 0 BFC CERTIFY CCW
  [0,"BFC","CERTIFY"],
  [0,"BFC","CCW"],
// 
// 0 !HISTORY 2003-03-12 [PTadmin] Official Update 2003-01
// 0 !HISTORY 2007-06-24 [PTadmin] Header formatted for Contributor Agreement
// 0 !HISTORY 2008-07-01 [PTadmin] Official Update 2008-01
// 0 !HISTORY 2012-02-16 [Philo] Changed to CCW
// 0 !HISTORY 2012-03-30 [PTadmin] Official Update 2012-01
// 
// 
// 2 24 1 1 1 -1 1 1
  [2,24,1,1,1,-1,1,1],
// 2 24 -1 1 -1 1 1 -1
  [2,24,-1,1,-1,1,1,-1],
// 2 24 1 0 1 -1 0 1
  [2,24,1,0,1,-1,0,1],
// 2 24 -1 0 -1 1 0 -1
  [2,24,-1,0,-1,1,0,-1],
// 2 24 1 1 1 1 1 -1
  [2,24,1,1,1,1,1,-1],
// 2 24 -1 1 1 -1 1 -1
  [2,24,-1,1,1,-1,1,-1],
// 2 24 1 1 1 1 0 1
  [2,24,1,1,1,1,0,1],
// 2 24 1 1 -1 1 0 -1
  [2,24,1,1,-1,1,0,-1],
// 2 24 -1 1 1 -1 0 1
  [2,24,-1,1,1,-1,0,1],
// 2 24 -1 1 -1 -1 0 -1
  [2,24,-1,1,-1,-1,0,-1],
// 4 16 -1 1 -1 -1 1 1 1 1 1 1 1 -1
  [4,16,-1,1,-1,-1,1,1,1,1,1,1,1,-1],
// 4 16 -1 1 1 -1 0 1 1 0 1 1 1 1
  [4,16,-1,1,1,-1,0,1,1,0,1,1,1,1],
// 4 16 1 1 -1 1 0 -1 -1 0 -1 -1 1 -1
  [4,16,1,1,-1,1,0,-1,-1,0,-1,-1,1,-1],
];
module ldraw_lib__box3u2p(step=0, col=false, unit=2/5, alt=false, line=0.2, solid=!$preview)
    makepoly(ldraw_lib__box3u2p(), step=step, col=col, unit=unit, alt=alt, line=line, solid=solid);
ldraw_lib__box3u2p(line=0.2);
// file: 954.scad
use <../lib.scad>
use <../p/box.scad>
function ldraw_lib__954() = [
// 0 ~Glass for Window  1 x  4 x  5 with Fixed Glass
// 0 Name: 954.dat
// 0 Author: Alex Taylor [anathema]
// 0 !LDRAW_ORG Part UPDATE 2010-02
// 0 !LICENSE Licensed under CC BY 2.0 and CC BY 4.0 : see CAreadme.txt
// 
// 0 BFC CERTIFY CCW
  [0,"BFC","CERTIFY"],
  [0,"BFC","CCW"],
// 
// 0 !HISTORY 2010-07-05 [PTadmin] Official Update 2010-02
// 
// 
// 1 16 0 0 0 36 0 0 0 54 0 0 0 1 box.dat
  [1,16,0,0,0,36,0,0,0,54,0,0,0,1, ldraw_lib__box()],
// 0
];
module ldraw_lib__954(step=0, col=false, unit=2/5, alt=false, line=0.2, solid=!$preview)
    makepoly(ldraw_lib__954(), step=step, col=col, unit=unit, alt=alt, line=line, solid=solid);
ldraw_lib__954(line=0.2);
// file: 4347.scad
use <../lib.scad>
use <../p/box3u2p.scad>
use <../p/box4.scad>
use <../p/box5.scad>
use <../p/stud.scad>
use <../p/stud3.scad>
$fa=1; $fs=0.2;
function ldraw_lib__4347(realsolid=false) = [
// 0 ~Window  1 x  4 x  5 with Fixed Glass - Frame
// 0 Name: 4347.dat
// 0 Author: Alex Taylor [anathema]
// 0 !LDRAW_ORG Part UPDATE 2010-02
// 0 !LICENSE Licensed under CC BY 2.0 and CC BY 4.0 : see CAreadme.txt
// 
// 0 BFC CERTIFY CCW
  [0,"BFC","CERTIFY"],
  [0,"BFC","CCW"],
// 
// 0 !HISTORY 2010-07-05 [PTadmin] Official Update 2010-02
// 
// 
// 1 16 20 116 0 1 0 0 0 -1 0 0 0 1 stud3.dat
  [1,16,20,116,0,1,0,0,0,-1,0,0,0,1, ldraw_lib__stud3(realsolid)],
// 1 16 0 116 0 1 0 0 0 -1 0 0 0 1 stud3.dat
  [1,16,0,116,0,1,0,0,0,-1,0,0,0,1, ldraw_lib__stud3(realsolid)],
// 1 16 -20 116 0 1 0 0 0 -1 0 0 0 1 stud3.dat
  [1,16,-20,116,0,1,0,0,0,-1,0,0,0,1, ldraw_lib__stud3(realsolid)],
// 0 BFC INVERTNEXT
  [0,"BFC","INVERTNEXT"],
// 1 16 0 120 0 36 0 0 0 -4 0 0 0 6 box5.dat
  [1,16,0,120,0,36,0,0,0,-4,0,0,0,6, ldraw_lib__box5(realsolid)],
// 4 16 40 120 10 36 120 6 -36 120 6 -40 120 10
  [4,16,40,120,10,36,120,6,-36,120,6,-40,120,10],
// 4 16 -40 120 10 -36 120 6 -36 120 -6 -40 120 -10
  [4,16,-40,120,10,-36,120,6,-36,120,-6,-40,120,-10],
// 4 16 -40 120 -10 -36 120 -6 36 120 -6 40 120 -10
  [4,16,-40,120,-10,-36,120,-6,36,120,-6,40,120,-10],
// 4 16 40 120 -10 36 120 -6 36 120 6 40 120 10
  [4,16,40,120,-10,36,120,-6,36,120,6,40,120,10],
// 4 16 32 8 -6 -32 8 -6 -36 4 -6 36 4 -6
  [4,16,32,8,-6,-32,8,-6,-36,4,-6,36,4,-6],
// 4 16 -32 8 -6 -32 108 -6 -36 112 -6 -36 4 -6
  [4,16,-32,8,-6,-32,108,-6,-36,112,-6,-36,4,-6],
// 4 16 36 112 -6 -36 112 -6 -32 108 -6 32 108 -6
  [4,16,36,112,-6,-36,112,-6,-32,108,-6,32,108,-6],
// 4 16 36 4 -6 36 112 -6 32 108 -6 32 8 -6
  [4,16,36,4,-6,36,112,-6,32,108,-6,32,8,-6],
// 4 16 36 4 10 -36 4 10 -40 0 10 40 0 10
  [4,16,36,4,10,-36,4,10,-40,0,10,40,0,10],
// 4 16 -36 4 10 -36 112 10 -40 120 10 -40 0 10
  [4,16,-36,4,10,-36,112,10,-40,120,10,-40,0,10],
// 4 16 -36 112 10 36 112 10 40 120 10 -40 120 10
  [4,16,-36,112,10,36,112,10,40,120,10,-40,120,10],
// 4 16 40 0 10 40 120 10 36 112 10 36 4 10
  [4,16,40,0,10,40,120,10,36,112,10,36,4,10],
// 4 16 40 0 -10 -40 0 -10 -32 8 -10 32 8 -10
  [4,16,40,0,-10,-40,0,-10,-32,8,-10,32,8,-10],
// 4 16 -40 0 -10 -40 120 -10 -32 108 -10 -32 8 -10
  [4,16,-40,0,-10,-40,120,-10,-32,108,-10,-32,8,-10],
// 4 16 -40 120 -10 40 120 -10 32 108 -10 -32 108 -10
  [4,16,-40,120,-10,40,120,-10,32,108,-10,-32,108,-10],
// 4 16 32 8 -10 32 108 -10 40 120 -10 40 0 -10
  [4,16,32,8,-10,32,108,-10,40,120,-10,40,0,-10],
// 1 16 30 0 0 -1 0 0 0 1 0 0 0 -1 stud.dat
  [1,16,30,0,0,-1,0,0,0,1,0,0,0,-1, ldraw_lib__stud(realsolid)],
// 1 16 10 0 0 -1 0 0 0 1 0 0 0 -1 stud.dat
  [1,16,10,0,0,-1,0,0,0,1,0,0,0,-1, ldraw_lib__stud(realsolid)],
// 1 16 -10 0 0 -1 0 0 0 1 0 0 0 -1 stud.dat
  [1,16,-10,0,0,-1,0,0,0,1,0,0,0,-1, ldraw_lib__stud(realsolid)],
// 1 16 -30 0 0 -1 0 0 0 1 0 0 0 -1 stud.dat
  [1,16,-30,0,0,-1,0,0,0,1,0,0,0,-1, ldraw_lib__stud(realsolid)],
// 1 16 0 120 0 0 0 -40 0 -120 0 -10 0 0 box3u2p.dat
  [1,16,0,120,0,0,0,-40,0,-120,0,-10,0,0, ldraw_lib__box3u2p(realsolid)],
// 0 BFC INVERTNEXT
  [0,"BFC","INVERTNEXT"],
// 1 16 0 58 -6 0 0 -36 -54 0 0 0 16 0 box4.dat
  [1,16,0,58,-6,0,0,-36,-54,0,0,0,16,0, ldraw_lib__box4(realsolid)],
// 0 BFC INVERTNEXT
  [0,"BFC","INVERTNEXT"],
// 1 16 0 58 -10 0 0 -32 -50 0 0 0 4 0 box4.dat
  [1,16,0,58,-10,0,0,-32,-50,0,0,0,4,0, ldraw_lib__box4(realsolid)],
// 2 24 -40 120 -10 40 120 -10
  [2,24,-40,120,-10,40,120,-10],
// 2 24 -40 120 10 40 120 10
  [2,24,-40,120,10,40,120,10],
// 0
];
module ldraw_lib__4347(step=0, col=false, unit=2/5, alt=false, line=0.2, solid=!$preview)
    makepoly(ldraw_lib__4347(solid), step=step, col=col, unit=unit, alt=alt, line=line, solid=solid);
ldraw_lib__4347(line=0.2);
// file: ../p/box5-12.scad
use <../lib.scad>
function ldraw_lib__box5_12() = [
// 0 Box with 5 Faces without Any Edges
// 0 Name: box5-12.dat
// 0 Author: Chris Dee [cwdee]
// 0 !LDRAW_ORG Primitive UPDATE 2009-02
// 0 !LICENSE Licensed under CC BY 2.0 and CC BY 4.0 : see CAreadme.txt
// 
// 0 BFC CERTIFY CCW
  [0,"BFC","CERTIFY"],
  [0,"BFC","CCW"],
// 
// 0 !HISTORY 2009-09-03 [PTadmin] Official Update 2009-02
// 
// 
// 4 16 1 1 1 1 1 -1 -1 1 -1 -1 1 1
  [4,16,1,1,1,1,1,-1,-1,1,-1,-1,1,1],
// 4 16 -1 0 1 1 0 1 1 1 1 -1 1 1
  [4,16,-1,0,1,1,0,1,1,1,1,-1,1,1],
// 4 16 -1 0 -1 -1 0 1 -1 1 1 -1 1 -1
  [4,16,-1,0,-1,-1,0,1,-1,1,1,-1,1,-1],
// 4 16 1 0 -1 -1 0 -1 -1 1 -1 1 1 -1
  [4,16,1,0,-1,-1,0,-1,-1,1,-1,1,1,-1],
// 4 16 1 0 1 1 0 -1 1 1 -1 1 1 1
  [4,16,1,0,1,1,0,-1,1,1,-1,1,1,1],
// 0
];
module ldraw_lib__box5_12(step=0, col=false, unit=2/5, alt=false, line=0.2, solid=!$preview)
    makepoly(ldraw_lib__box5_12(), step=step, col=col, unit=unit, alt=alt, line=line, solid=solid);
ldraw_lib__box5_12(line=0.2);
// file: 4347c01.scad
use <../lib.scad>
use <4347.scad>
use <954.scad>
function ldraw_lib__4347c01() = [
// 0 Window  1 x  4 x  5 with Fixed Glass (Complete)
// 0 Name: 4347c01.dat
// 0 Author: Alex Taylor [anathema]
// 0 !LDRAW_ORG Shortcut UPDATE 2010-02
// 0 !LICENSE Licensed under CC BY 4.0 : see CAreadme.txt
// 
// 0 BFC CERTIFY CCW
  [0,"BFC","CERTIFY"],
  [0,"BFC","CCW"],
// 
// 0 !KEYWORDS BrickLink 4347, Rebrickable 4347
// 
// 0 !HISTORY 2010-07-05 [PTadmin] Official Update 2010-02
// 
// 
// 1 16 0 0 0 1 0 0 0 1 0 0 0 1 4347.dat
  [1,16,0,0,0,1,0,0,0,1,0,0,0,1, ldraw_lib__4347()],
// 1 47 0 58 -4 1 0 0 0 1 0 0 0 1 954.dat
  [1,47,0,58,-4,1,0,0,0,1,0,0,0,1, ldraw_lib__954()],
// 0
];
module ldraw_lib__4347c01(step=0, col=false, unit=2/5, alt=false, line=0.2, solid=!$preview)
    makepoly(ldraw_lib__4347c01(), step=step, col=col, unit=unit, alt=alt, line=line, solid=solid);
ldraw_lib__4347c01(line=0.2);
// main file
use <../lib.scad>
use <194535c.scad>
use <4347c01.scad>
function ldraw_lib__4347c01d01() = [
// 0 Window  1 x  4 x  5 with Fixed Glass with White "ANWB" Sticker (Complete)
// 0 Name: 4347c01d01.dat
// 0 Author: Takeshi Takahashi [RainbowDolphin]
// 0 !LDRAW_ORG Shortcut UPDATE 2024-07
// 0 !LICENSE Licensed under CC BY 4.0 : see CAreadme.txt
// 
// 0 BFC CERTIFY CCW
  [0,"BFC","CERTIFY"],
  [0,"BFC","CCW"],
// 
// 0 !CATEGORY Sticker Shortcut
// 0 !KEYWORDS Breakdown assistance, Bricklink 4347pb03, Set 1590-2
// 
// 0 !HISTORY 2024-08-26 [OrionP] Official Update 2024-07
// 
// 1 16 0 0 0 1 0 0 0 1 0 0 0 1 4347c01.dat
  [1,16,0,0,0,1,0,0,0,1,0,0,0,1, ldraw_lib__4347c01()],
// 1 15 0 20 -6 1 0 0 0 0 -1 0 1 0 194535c.dat
  [1,15,0,20,-6,1,0,0,0,0,-1,0,1,0, ldraw_lib__194535c()],
];
module ldraw_lib__4347c01d01(step=0, col=false, unit=2/5, alt=false, line=0.2, solid=!$preview)
    makepoly(ldraw_lib__4347c01d01(), step=step, col=col, unit=unit, alt=alt, line=line, solid=solid);
ldraw_lib__4347c01d01(line=0.2);
